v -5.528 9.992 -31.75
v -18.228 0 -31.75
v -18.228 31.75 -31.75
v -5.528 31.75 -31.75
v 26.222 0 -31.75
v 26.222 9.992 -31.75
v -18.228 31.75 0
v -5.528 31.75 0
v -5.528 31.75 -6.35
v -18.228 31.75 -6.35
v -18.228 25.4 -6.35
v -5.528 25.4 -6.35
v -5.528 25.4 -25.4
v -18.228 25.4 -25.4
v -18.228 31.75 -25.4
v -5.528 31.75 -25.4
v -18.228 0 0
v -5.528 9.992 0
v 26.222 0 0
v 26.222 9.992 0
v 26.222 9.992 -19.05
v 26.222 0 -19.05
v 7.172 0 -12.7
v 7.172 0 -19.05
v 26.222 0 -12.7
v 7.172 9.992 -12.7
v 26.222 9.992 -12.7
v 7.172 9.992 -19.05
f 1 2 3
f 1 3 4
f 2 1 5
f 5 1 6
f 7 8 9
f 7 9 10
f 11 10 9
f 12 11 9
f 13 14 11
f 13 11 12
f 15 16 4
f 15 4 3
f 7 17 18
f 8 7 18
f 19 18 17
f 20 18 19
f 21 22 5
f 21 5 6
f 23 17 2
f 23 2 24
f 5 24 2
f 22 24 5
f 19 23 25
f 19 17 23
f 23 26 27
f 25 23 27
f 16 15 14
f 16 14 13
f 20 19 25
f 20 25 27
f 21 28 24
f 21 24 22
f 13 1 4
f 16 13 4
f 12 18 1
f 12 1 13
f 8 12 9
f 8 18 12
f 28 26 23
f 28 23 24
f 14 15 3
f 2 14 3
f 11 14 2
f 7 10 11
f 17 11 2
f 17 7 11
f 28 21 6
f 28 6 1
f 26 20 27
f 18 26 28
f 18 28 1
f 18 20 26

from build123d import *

# Parameters (mm, degrees)
BOSS_EXTRUDE1_DEPTH = 31.75
SKETCH3_W           = 12.7
SKETCH3_H           = 19.05
CUT_EXTRUDE1_DEPTH  = 6.35
SKETCH4_W           = 19.05
SKETCH4_H           = 6.35
CUT_EXTRUDE2_DEPTH  = 47.573244244


with BuildPart() as part:
    # Sketch2 → Boss-Extrude1 (new body)
    with BuildSketch(Plane.XY):
        Polygon((-18.228399123, 0), (26.221600877, 0), (26.221600877, 9.991502193), (-5.528399123, 9.991502193), (-5.528399123, 31.75), (-18.228399123, 31.75), align=None)
    extrude(amount=-BOSS_EXTRUDE1_DEPTH)

    # Sketch3 → Cut-Extrude1 (cut)
    with BuildSketch(Plane(origin=(0, 31.75, 0), x_dir=(1, 0, 0), z_dir=(0, 1, 0))):
        with Locations((-11.878399123, 15.875)):
            Rectangle(SKETCH3_W, SKETCH3_H)
    extrude(amount=-CUT_EXTRUDE1_DEPTH, mode=Mode.SUBTRACT)

    # Sketch4 → Cut-Extrude2 (cut, through all)
    with BuildSketch(Plane(origin=(0, 9.991502193, 0), x_dir=(1, 0, 0), z_dir=(0, 1, 0))):
        with Locations((16.696600877, 15.875)):
            Rectangle(SKETCH4_W, SKETCH4_H)
    extrude(amount=-CUT_EXTRUDE2_DEPTH, mode=Mode.SUBTRACT)


solid = part.part
